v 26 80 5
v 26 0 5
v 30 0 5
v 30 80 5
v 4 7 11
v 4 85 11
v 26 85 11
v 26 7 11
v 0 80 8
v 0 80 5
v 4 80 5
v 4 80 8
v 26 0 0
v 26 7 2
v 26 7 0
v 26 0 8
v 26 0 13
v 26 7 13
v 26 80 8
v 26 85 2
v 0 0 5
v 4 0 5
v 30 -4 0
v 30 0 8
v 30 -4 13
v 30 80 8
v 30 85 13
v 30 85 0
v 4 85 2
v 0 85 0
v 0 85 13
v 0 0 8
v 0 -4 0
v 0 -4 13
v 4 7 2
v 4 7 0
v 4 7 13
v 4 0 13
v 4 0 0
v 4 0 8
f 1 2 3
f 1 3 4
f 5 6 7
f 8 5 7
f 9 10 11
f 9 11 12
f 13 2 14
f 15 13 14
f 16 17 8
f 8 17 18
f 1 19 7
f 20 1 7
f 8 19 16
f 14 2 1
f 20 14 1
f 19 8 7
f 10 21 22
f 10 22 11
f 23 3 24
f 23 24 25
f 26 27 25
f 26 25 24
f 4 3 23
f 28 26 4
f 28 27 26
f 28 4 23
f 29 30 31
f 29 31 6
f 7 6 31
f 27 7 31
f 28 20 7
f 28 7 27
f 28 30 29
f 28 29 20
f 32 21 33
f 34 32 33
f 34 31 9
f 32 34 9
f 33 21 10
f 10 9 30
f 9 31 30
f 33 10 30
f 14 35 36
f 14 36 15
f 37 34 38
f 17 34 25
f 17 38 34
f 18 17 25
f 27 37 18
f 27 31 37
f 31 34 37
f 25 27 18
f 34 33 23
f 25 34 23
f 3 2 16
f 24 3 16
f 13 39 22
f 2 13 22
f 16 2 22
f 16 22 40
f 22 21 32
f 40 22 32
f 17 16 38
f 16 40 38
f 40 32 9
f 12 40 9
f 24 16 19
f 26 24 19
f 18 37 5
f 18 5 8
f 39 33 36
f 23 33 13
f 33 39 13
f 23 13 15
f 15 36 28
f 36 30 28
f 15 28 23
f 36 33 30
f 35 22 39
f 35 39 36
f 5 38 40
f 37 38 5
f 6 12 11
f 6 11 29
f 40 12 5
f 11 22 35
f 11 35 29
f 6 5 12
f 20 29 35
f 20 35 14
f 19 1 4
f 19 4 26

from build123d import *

# Parameters (mm, degrees)
SKETCH1_W           = 30
SKETCH1_H           = 13
BOSS_EXTRUDE1_DEPTH = 85
SKETCH2_W           = 22
SKETCH2_H           = 9
CUT_EXTRUDE2_DEPTH  = 85
SKETCH5_W           = 30
SKETCH5_H           = 13
BOSS_EXTRUDE3_DEPTH = 4
SKETCH12_W          = 22
SKETCH12_H          = 7
CUT_EXTRUDE4_DEPTH  = 13
SKETCH13_W          = 3
SKETCH13_H          = 80
CUT_EXTRUDE5_DEPTH  = 92.07140056


with BuildPart() as part:
    # Sketch1 → Boss-Extrude1 (new body)
    with BuildSketch(Plane(origin=(0, 0, 0), x_dir=(1, 0, 0), z_dir=(0, 1, 0))):
        with Locations((15, -6.5)):
            Rectangle(SKETCH1_W, SKETCH1_H)
    extrude(amount=BOSS_EXTRUDE1_DEPTH)

    # Sketch2 → Cut-Extrude2 (cut)
    with BuildSketch(Plane(origin=(0, 85, 0), x_dir=(1, 0, 0), z_dir=(0, 1, 0))):
        with Locations((15, -6.5)):
            Rectangle(SKETCH2_W, SKETCH2_H)
    extrude(amount=-CUT_EXTRUDE2_DEPTH, mode=Mode.SUBTRACT)

    # Sketch5 → Boss-Extrude3 (add)
    with BuildSketch(Plane(origin=(0, 0, 0), x_dir=(1, 0, 0), z_dir=(0, 1, 0))):
        with Locations((15, -6.5)):
            Rectangle(SKETCH5_W, SKETCH5_H)
    extrude(amount=-BOSS_EXTRUDE3_DEPTH)

    # Sketch12 → Cut-Extrude4 (cut)
    with BuildSketch(Plane.XY.offset(13)):
        with Locations((15, 3.5)):
            Rectangle(SKETCH12_W, SKETCH12_H)
    extrude(amount=-CUT_EXTRUDE4_DEPTH, mode=Mode.SUBTRACT)

    # Sketch13 → Cut-Extrude5 (cut, through all)
    with BuildSketch(Plane.ZY):
        with Locations((6.5, 40)):
            Rectangle(SKETCH13_W, SKETCH13_H)
    extrude(amount=-CUT_EXTRUDE5_DEPTH, mode=Mode.SUBTRACT)


solid = part.part
